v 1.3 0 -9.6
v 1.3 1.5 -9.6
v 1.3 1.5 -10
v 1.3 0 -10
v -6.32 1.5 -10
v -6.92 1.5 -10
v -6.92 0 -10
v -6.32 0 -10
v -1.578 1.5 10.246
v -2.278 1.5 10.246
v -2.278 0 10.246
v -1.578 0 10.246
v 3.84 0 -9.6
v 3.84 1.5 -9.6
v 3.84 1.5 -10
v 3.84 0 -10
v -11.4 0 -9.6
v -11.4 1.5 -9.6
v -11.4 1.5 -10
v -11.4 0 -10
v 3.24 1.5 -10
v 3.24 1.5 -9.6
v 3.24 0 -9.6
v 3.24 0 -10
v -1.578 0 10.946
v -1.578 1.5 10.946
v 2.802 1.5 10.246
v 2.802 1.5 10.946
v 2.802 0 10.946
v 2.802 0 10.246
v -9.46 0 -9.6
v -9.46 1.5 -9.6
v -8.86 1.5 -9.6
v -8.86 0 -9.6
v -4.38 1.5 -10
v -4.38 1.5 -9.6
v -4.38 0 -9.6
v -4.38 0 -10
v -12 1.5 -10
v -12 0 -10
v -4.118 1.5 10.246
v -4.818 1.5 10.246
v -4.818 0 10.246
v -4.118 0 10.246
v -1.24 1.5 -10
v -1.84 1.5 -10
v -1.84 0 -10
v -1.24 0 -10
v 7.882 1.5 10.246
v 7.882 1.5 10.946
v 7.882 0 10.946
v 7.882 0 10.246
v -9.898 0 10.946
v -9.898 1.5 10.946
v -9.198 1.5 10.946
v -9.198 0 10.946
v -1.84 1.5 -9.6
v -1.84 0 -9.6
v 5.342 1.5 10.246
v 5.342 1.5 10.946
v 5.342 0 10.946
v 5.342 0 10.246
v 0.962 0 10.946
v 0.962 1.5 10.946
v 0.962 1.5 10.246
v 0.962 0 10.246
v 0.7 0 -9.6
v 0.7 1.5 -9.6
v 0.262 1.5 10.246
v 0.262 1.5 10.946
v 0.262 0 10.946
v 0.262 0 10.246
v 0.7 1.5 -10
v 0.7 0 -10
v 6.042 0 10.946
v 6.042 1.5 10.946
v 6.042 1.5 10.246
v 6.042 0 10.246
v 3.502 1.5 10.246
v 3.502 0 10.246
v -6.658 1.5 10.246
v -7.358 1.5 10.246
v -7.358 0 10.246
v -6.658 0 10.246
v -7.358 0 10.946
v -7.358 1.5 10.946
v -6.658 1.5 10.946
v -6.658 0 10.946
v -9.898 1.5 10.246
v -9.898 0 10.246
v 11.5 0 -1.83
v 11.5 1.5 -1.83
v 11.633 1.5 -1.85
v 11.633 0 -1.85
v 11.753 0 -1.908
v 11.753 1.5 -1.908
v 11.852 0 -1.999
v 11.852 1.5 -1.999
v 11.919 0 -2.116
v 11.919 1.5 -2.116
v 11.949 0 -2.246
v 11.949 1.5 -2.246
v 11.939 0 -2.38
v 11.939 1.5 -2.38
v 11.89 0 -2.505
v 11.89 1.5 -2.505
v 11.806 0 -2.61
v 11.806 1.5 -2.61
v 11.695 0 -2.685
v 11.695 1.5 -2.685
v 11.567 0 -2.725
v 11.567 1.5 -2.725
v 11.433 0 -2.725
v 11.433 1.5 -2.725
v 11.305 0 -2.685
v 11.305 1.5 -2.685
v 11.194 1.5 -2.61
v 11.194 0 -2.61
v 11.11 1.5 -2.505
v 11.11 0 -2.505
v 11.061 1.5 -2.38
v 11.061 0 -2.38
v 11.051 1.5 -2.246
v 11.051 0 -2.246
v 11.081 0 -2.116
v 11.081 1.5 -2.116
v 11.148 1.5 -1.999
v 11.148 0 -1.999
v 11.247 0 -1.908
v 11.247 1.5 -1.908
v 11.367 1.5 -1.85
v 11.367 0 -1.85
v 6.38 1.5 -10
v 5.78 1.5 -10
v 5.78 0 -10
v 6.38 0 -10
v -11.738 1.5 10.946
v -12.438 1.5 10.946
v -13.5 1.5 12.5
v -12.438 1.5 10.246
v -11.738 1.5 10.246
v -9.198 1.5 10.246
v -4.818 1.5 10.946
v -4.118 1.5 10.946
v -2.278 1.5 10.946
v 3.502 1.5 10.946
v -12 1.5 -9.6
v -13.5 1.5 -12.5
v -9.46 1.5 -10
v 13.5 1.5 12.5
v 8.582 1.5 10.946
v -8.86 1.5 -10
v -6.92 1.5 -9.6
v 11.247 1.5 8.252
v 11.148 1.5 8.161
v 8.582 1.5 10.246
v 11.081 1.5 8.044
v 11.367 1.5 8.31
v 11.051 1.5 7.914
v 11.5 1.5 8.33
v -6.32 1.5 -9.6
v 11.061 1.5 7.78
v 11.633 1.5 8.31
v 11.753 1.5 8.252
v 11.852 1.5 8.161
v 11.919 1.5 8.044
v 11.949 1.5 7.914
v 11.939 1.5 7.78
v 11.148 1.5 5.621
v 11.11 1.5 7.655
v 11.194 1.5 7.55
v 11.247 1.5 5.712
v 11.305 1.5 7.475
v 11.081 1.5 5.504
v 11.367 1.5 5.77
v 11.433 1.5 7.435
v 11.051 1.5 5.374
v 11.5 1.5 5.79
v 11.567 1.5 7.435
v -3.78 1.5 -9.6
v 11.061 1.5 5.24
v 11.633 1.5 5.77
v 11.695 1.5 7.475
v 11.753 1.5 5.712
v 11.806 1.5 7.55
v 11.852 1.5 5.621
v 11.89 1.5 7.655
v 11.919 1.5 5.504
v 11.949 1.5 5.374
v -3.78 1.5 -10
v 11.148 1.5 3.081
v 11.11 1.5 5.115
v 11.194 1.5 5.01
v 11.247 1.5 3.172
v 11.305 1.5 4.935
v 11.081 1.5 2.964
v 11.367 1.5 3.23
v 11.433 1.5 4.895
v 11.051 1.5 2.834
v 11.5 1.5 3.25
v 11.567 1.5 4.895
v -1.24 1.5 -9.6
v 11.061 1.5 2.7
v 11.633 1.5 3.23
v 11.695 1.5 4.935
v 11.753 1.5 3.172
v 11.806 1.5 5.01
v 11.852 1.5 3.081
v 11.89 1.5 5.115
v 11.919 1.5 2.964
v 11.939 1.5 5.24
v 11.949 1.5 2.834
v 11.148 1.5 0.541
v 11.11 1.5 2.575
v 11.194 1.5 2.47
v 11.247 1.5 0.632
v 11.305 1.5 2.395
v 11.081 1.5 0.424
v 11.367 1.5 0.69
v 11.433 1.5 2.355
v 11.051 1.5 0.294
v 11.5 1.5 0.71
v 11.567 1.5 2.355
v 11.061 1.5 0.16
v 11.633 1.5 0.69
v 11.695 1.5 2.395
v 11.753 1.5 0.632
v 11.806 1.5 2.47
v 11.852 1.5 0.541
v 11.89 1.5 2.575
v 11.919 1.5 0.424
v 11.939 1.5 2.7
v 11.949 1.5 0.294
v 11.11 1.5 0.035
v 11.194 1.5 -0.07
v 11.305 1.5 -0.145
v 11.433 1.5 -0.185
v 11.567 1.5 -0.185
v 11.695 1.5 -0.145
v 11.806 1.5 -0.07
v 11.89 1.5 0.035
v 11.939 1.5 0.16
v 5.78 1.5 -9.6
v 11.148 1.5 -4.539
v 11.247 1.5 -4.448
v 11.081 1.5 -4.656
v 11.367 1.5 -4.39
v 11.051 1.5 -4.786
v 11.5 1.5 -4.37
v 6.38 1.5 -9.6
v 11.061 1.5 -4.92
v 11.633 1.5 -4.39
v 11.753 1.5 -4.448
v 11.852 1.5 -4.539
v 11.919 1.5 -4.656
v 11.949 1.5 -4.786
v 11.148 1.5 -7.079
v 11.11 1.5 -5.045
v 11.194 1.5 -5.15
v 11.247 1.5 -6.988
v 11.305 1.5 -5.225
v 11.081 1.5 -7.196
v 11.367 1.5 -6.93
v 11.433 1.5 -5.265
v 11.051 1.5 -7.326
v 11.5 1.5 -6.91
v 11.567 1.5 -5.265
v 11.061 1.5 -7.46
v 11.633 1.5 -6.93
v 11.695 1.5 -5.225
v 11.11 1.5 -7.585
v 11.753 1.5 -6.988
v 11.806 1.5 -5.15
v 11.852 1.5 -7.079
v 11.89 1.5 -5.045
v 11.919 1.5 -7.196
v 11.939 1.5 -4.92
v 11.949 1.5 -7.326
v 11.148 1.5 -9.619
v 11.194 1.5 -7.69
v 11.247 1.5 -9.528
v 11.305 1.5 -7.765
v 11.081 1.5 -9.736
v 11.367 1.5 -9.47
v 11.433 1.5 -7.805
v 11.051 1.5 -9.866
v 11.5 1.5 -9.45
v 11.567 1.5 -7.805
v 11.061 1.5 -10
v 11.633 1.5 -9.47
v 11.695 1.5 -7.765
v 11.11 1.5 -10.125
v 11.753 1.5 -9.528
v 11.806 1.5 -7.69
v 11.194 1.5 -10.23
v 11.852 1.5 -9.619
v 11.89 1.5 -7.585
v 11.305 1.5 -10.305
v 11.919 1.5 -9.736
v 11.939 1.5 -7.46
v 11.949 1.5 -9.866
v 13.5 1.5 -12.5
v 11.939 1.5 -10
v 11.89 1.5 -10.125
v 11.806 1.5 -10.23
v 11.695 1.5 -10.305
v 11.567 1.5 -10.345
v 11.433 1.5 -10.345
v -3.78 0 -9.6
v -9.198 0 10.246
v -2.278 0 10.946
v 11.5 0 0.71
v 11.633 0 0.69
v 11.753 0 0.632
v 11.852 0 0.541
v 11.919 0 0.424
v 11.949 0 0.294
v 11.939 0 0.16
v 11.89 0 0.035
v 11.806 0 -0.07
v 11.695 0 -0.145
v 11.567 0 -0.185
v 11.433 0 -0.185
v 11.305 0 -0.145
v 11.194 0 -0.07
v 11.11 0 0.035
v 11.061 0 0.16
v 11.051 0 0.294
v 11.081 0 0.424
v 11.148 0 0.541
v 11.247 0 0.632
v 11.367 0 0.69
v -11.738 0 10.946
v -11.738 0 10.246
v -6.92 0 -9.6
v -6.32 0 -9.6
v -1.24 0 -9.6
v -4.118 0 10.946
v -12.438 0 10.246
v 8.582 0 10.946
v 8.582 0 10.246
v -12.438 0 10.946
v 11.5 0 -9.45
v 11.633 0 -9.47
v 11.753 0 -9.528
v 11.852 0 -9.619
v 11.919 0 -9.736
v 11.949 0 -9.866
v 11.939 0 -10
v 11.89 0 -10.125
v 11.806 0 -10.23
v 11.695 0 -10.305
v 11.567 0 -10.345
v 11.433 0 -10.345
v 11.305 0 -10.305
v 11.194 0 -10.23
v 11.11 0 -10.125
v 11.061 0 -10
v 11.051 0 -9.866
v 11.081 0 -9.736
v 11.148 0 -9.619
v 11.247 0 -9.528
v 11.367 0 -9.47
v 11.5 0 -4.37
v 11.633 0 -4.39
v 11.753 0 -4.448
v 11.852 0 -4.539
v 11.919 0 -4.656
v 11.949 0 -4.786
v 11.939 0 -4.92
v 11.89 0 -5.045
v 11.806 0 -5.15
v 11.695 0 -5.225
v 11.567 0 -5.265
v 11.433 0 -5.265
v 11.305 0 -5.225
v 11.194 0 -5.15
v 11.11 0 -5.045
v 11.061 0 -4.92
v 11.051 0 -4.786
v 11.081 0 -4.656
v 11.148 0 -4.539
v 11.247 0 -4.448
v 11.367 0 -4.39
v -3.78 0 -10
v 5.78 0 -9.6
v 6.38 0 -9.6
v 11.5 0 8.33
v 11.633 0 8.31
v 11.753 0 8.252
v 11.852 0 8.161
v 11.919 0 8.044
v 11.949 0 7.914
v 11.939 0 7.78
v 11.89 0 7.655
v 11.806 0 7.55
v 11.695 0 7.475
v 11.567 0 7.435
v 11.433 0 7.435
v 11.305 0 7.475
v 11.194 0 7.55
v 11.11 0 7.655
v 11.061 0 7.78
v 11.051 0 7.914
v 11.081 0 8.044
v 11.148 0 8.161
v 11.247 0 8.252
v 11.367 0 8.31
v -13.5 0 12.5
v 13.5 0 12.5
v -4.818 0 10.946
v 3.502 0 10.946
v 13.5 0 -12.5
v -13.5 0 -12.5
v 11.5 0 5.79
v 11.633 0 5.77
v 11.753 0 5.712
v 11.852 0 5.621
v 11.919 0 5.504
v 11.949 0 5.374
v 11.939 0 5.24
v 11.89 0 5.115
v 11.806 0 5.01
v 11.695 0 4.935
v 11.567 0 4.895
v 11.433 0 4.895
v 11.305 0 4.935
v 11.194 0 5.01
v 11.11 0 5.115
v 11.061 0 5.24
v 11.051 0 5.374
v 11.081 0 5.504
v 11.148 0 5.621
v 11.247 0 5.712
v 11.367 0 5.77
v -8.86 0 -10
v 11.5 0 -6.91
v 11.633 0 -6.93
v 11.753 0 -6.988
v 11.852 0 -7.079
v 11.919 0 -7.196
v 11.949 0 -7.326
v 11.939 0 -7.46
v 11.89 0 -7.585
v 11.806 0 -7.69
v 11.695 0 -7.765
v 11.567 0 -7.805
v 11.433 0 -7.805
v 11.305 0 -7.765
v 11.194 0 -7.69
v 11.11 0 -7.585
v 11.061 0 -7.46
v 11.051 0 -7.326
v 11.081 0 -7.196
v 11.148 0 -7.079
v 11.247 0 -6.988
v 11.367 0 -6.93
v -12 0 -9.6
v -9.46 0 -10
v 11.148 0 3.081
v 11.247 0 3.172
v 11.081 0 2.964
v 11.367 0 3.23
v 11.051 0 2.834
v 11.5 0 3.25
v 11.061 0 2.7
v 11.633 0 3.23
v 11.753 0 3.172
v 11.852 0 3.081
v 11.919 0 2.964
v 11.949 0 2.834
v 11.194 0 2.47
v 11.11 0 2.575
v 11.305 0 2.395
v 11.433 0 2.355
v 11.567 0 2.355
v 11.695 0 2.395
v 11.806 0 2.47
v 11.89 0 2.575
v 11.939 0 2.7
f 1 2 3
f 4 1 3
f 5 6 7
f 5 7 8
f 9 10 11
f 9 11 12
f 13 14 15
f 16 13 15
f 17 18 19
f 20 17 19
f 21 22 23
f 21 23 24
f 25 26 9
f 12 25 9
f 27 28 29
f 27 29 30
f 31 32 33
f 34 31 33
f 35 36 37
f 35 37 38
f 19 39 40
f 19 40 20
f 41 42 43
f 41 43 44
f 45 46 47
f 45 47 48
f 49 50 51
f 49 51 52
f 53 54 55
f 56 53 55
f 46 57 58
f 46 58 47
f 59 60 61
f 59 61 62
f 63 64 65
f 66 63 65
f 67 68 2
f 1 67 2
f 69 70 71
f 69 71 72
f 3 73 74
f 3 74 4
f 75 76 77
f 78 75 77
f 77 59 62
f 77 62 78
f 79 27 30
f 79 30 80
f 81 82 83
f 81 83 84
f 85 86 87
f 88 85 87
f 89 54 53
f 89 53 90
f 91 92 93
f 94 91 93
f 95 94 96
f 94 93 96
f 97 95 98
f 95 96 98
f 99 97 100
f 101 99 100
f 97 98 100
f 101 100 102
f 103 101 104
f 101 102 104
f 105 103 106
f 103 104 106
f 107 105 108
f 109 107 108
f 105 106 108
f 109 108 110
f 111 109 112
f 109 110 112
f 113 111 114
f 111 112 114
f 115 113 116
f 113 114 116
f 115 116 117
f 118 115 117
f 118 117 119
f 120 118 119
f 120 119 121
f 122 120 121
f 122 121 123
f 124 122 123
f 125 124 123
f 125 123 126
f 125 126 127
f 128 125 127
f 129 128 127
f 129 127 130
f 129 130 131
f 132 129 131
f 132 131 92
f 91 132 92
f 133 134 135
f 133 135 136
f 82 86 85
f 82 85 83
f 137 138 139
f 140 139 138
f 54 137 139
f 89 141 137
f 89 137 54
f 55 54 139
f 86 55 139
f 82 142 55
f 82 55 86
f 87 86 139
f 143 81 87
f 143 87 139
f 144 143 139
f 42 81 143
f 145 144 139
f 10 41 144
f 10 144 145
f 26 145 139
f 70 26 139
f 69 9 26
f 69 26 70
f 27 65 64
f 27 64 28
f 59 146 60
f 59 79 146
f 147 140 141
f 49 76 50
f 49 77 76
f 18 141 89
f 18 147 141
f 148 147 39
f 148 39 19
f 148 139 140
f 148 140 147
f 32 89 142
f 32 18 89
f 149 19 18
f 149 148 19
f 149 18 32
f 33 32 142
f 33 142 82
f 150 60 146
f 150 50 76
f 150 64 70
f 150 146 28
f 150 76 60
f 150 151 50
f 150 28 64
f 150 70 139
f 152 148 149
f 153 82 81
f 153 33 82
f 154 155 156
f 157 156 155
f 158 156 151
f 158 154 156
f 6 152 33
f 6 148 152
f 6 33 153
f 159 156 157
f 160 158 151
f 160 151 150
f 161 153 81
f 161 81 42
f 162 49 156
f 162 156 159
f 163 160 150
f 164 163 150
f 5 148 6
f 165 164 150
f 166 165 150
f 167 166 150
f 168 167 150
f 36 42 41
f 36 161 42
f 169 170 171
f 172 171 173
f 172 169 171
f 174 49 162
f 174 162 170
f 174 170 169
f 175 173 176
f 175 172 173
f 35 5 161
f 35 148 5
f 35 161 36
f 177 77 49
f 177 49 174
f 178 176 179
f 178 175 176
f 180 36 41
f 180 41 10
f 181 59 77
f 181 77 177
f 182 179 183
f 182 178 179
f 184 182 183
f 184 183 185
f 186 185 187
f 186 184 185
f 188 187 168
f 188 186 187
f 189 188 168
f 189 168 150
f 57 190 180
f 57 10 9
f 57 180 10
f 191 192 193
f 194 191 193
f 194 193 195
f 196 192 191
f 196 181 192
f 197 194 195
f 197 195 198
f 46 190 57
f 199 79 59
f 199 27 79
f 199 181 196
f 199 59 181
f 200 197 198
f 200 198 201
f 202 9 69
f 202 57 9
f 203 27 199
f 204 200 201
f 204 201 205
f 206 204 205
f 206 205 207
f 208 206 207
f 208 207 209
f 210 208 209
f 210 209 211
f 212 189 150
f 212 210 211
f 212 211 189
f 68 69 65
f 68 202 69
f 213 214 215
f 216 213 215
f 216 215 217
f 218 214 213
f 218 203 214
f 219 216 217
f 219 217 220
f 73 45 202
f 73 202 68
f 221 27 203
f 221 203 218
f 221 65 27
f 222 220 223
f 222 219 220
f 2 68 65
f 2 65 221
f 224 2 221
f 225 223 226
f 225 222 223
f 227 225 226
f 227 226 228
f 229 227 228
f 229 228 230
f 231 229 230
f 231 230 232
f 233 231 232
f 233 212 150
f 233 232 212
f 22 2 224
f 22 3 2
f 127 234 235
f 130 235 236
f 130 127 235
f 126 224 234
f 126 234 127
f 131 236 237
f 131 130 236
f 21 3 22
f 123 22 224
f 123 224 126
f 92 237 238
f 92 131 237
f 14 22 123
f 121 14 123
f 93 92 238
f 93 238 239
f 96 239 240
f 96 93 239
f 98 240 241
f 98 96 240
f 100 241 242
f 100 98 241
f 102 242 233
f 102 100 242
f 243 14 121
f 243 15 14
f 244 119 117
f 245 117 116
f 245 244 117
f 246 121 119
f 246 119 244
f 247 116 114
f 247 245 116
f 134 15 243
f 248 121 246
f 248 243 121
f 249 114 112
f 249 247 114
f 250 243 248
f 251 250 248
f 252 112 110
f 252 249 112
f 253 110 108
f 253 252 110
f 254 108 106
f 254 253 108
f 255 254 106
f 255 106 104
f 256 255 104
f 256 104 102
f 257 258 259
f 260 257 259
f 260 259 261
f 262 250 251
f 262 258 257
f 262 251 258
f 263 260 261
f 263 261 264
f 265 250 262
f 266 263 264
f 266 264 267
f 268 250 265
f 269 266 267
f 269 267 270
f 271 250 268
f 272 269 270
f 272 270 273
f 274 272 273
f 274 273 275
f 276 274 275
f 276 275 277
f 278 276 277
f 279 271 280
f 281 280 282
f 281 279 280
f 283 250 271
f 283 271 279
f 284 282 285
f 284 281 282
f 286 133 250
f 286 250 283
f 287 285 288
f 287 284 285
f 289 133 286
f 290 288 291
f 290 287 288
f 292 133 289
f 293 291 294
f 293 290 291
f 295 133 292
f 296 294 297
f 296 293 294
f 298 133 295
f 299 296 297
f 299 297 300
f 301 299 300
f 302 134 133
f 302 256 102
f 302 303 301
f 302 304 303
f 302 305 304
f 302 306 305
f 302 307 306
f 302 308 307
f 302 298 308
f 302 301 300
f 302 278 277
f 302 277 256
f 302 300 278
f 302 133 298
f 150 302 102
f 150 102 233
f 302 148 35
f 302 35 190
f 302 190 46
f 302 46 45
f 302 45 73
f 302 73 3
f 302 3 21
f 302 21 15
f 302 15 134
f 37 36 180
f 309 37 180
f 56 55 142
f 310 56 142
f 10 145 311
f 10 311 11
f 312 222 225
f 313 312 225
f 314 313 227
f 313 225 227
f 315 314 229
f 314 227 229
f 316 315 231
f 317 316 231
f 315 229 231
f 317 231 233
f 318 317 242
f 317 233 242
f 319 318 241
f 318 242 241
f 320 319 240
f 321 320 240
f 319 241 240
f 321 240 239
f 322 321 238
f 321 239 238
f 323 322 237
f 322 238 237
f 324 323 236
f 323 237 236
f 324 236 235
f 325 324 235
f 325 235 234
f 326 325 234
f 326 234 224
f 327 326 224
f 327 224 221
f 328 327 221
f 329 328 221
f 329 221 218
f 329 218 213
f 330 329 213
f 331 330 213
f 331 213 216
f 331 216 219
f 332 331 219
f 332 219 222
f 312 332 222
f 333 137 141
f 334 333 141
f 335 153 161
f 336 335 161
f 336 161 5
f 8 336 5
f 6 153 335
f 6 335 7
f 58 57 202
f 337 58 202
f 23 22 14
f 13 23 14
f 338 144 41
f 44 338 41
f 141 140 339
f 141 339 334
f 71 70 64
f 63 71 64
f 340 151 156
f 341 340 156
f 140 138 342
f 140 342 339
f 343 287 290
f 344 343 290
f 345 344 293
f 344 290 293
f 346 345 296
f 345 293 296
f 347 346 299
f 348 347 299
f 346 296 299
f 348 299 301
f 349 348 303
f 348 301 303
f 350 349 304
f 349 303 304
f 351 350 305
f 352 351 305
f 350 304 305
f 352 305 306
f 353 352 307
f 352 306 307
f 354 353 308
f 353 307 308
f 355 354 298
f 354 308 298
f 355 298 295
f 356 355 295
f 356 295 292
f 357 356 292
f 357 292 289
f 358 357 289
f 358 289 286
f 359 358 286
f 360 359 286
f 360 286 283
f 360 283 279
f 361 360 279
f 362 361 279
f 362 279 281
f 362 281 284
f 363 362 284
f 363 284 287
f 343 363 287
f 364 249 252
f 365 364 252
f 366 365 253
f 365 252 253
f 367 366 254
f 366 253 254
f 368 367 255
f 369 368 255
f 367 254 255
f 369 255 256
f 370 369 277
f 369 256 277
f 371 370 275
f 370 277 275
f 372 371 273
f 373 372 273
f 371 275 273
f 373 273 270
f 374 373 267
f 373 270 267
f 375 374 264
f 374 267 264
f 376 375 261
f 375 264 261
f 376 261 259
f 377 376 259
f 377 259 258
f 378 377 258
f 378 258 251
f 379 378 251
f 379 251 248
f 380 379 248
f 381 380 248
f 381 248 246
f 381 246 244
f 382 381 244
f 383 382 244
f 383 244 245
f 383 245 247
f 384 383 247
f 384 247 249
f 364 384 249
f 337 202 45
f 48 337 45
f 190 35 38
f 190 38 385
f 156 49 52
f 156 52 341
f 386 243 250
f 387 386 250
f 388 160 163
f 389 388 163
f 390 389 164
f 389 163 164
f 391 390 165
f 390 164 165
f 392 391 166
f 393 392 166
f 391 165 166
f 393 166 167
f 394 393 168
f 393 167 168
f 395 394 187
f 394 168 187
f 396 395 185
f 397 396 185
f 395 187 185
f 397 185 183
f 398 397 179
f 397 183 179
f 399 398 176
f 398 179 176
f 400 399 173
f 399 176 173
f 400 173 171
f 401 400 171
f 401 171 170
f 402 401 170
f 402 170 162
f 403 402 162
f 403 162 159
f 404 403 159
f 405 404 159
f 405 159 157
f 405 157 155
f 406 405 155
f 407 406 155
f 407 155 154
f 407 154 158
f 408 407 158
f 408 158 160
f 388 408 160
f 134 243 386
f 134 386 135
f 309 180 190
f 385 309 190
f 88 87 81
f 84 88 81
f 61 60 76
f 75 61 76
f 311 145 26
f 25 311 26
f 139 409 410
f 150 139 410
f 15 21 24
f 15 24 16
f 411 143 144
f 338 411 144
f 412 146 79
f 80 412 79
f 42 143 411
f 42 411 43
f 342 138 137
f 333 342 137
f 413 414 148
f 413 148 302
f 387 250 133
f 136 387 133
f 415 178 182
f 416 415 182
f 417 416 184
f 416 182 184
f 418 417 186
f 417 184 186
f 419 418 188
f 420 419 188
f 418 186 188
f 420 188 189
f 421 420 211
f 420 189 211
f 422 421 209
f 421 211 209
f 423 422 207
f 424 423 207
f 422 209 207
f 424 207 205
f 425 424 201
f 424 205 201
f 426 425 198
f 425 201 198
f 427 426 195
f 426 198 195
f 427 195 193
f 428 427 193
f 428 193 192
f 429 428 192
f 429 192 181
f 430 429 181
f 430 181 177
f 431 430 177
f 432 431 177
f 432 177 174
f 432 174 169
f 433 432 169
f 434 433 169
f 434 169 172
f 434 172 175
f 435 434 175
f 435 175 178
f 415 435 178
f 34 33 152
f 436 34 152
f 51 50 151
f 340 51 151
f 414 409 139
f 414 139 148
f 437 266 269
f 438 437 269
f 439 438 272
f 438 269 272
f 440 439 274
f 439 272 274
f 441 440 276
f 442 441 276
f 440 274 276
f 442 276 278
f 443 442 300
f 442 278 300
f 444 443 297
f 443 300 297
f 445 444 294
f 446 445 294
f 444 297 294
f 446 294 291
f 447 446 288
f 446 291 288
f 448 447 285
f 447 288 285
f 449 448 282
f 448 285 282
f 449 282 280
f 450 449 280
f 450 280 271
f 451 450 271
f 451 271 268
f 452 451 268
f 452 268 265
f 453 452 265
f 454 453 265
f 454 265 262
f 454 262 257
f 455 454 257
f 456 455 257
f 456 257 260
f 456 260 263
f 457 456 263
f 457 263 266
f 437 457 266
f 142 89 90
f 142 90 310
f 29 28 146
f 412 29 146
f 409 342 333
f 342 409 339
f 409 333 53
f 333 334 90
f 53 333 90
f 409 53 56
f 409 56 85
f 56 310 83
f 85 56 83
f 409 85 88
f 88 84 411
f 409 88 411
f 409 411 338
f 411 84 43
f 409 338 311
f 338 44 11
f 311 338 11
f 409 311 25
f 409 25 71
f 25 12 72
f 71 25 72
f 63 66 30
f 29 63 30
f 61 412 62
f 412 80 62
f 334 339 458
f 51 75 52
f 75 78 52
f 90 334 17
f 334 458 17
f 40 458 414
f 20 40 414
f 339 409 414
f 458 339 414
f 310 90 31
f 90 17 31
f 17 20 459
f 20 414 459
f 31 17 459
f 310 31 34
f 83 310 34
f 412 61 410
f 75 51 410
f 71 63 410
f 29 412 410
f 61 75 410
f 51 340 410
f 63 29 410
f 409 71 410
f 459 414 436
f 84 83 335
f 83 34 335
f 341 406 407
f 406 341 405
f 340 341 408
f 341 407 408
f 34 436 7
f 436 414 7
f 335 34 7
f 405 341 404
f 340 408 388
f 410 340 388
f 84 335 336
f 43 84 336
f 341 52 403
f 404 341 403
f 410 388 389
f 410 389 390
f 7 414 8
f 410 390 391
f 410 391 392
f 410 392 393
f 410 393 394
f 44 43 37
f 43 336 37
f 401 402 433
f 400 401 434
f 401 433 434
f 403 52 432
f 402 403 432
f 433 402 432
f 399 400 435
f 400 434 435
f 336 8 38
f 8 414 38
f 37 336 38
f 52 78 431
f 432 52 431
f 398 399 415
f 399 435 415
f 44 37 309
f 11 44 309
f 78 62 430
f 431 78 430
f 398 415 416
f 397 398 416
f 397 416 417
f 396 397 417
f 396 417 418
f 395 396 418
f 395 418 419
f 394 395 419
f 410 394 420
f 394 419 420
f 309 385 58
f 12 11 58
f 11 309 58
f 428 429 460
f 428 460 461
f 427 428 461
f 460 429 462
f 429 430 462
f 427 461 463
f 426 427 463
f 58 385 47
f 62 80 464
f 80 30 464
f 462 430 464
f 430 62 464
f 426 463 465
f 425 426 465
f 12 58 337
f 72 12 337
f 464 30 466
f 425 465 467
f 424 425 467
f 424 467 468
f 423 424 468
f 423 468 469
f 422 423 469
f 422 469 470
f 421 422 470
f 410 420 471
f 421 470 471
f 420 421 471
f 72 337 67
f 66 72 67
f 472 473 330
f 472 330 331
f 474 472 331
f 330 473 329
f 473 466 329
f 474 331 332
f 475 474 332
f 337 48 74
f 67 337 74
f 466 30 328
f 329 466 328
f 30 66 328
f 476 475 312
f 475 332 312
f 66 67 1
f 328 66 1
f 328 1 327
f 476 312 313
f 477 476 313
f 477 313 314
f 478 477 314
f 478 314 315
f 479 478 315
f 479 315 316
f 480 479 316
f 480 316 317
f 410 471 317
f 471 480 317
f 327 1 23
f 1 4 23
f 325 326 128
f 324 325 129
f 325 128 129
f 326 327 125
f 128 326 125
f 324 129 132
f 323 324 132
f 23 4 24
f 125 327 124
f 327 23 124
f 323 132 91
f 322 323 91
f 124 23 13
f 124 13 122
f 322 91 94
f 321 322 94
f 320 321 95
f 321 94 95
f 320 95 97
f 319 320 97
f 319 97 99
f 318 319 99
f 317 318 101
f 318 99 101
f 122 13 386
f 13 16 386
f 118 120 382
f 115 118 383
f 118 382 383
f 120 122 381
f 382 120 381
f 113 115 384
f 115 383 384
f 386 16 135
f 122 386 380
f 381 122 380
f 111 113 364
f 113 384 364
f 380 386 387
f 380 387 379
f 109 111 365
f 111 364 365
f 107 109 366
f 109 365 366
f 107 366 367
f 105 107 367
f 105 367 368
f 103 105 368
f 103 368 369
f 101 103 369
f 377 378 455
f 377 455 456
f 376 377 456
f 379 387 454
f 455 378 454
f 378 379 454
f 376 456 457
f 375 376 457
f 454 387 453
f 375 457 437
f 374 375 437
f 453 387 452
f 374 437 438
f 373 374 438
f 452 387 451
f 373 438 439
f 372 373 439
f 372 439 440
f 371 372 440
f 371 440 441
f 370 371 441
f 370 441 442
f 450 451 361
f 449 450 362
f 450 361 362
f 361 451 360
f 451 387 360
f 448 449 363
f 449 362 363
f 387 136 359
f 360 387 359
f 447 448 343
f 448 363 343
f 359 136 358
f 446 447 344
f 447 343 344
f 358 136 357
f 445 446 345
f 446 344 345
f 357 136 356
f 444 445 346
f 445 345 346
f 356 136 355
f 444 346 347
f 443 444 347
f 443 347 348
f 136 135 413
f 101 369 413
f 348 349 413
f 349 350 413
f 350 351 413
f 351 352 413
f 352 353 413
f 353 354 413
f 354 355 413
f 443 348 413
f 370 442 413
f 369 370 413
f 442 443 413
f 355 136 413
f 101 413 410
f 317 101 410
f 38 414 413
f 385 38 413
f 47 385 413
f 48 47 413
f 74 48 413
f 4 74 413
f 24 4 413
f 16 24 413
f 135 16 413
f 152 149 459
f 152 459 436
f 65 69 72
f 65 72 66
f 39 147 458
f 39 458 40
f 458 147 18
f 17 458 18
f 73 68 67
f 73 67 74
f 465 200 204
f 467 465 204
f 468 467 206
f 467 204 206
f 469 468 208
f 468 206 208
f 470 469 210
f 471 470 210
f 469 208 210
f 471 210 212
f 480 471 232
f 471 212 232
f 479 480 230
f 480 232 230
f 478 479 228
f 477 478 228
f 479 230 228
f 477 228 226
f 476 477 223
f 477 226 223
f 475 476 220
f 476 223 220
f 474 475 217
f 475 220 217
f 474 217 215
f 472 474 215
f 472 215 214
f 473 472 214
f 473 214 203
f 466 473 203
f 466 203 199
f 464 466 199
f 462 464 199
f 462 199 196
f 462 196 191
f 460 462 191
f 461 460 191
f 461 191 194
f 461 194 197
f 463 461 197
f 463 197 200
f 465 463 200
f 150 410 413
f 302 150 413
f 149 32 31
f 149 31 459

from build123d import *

# Parameters (mm, degrees)
SKETCH_1_W          = 27
SKETCH_1_H          = 25
EXTRUDE_1_DEPTH     = 1.5
SKETCH_2_R          = 0.45
SKETCH_2_W          = 0.6
SKETCH_2_H          = 0.4
SKETCH_2_W_2        = 0.7
SKETCH_2_H_2        = 0.7
CUT_EXTRUDE_1_DEPTH = 19.459414942


with BuildPart() as part:
    # Эскиз1 → Бобышка-Вытянуть1 (new body)
    with BuildSketch(Plane(origin=(0, 0, 0), x_dir=(1, 0, 0), z_dir=(0, 1, 0))):
        Rectangle(SKETCH_1_W, SKETCH_1_H)
    extrude(amount=EXTRUDE_1_DEPTH)

    # Эскиз2 → Вырез-Вытянуть1 (cut, through all)
    with BuildSketch(Plane(origin=(0, 1.5, 0), x_dir=(1, 0, 0), z_dir=(0, 1, 0))):
        with Locations(Location((11.5, 9.9, 0), (0, 0, 270))):
            Circle(SKETCH_2_R)
        with Locations(Location((11.5, 7.36, 0), (0, 0, 270))):
            Circle(SKETCH_2_R)
        with Locations(Location((11.5, 4.82, 0), (0, 0, 270))):
            Circle(SKETCH_2_R)
        with Locations(Location((11.5, 2.28, 0), (0, 0, 270))):
            Circle(SKETCH_2_R)
        with Locations(Location((11.5, -0.26, 0), (0, 0, 270))):
            Circle(SKETCH_2_R)
        with Locations(Location((11.5, -2.8, 0), (0, 0, 270))):
            Circle(SKETCH_2_R)
        with Locations(Location((11.5, -5.34, 0), (0, 0, 270))):
            Circle(SKETCH_2_R)
        with Locations(Location((11.5, -7.88, 0), (0, 0, 270))):
            Circle(SKETCH_2_R)
        with Locations((-9.16, 9.8)):
            Rectangle(SKETCH_2_W, SKETCH_2_H)
        with Locations((-11.7, 9.8)):
            Rectangle(SKETCH_2_W, SKETCH_2_H)
        with Locations((-6.62, 9.8)):
            Rectangle(SKETCH_2_W, SKETCH_2_H)
        with Locations((-4.08, 9.8)):
            Rectangle(SKETCH_2_W, SKETCH_2_H)
        with Locations((-1.54, 9.8)):
            Rectangle(SKETCH_2_W, SKETCH_2_H)
        with Locations((1, 9.8)):
            Rectangle(SKETCH_2_W, SKETCH_2_H)
        with Locations((3.54, 9.8)):
            Rectangle(SKETCH_2_W, SKETCH_2_H)
        with Locations((6.08, 9.8)):
            Rectangle(SKETCH_2_W, SKETCH_2_H)
        with Locations((-9.547856055, -10.59636646)):
            Rectangle(SKETCH_2_W_2, SKETCH_2_H_2)
        with Locations((-7.007856055, -10.59636646)):
            Rectangle(SKETCH_2_W_2, SKETCH_2_H_2)
        with Locations((-4.467856055, -10.59636646)):
            Rectangle(SKETCH_2_W_2, SKETCH_2_H_2)
        with Locations((-1.927856055, -10.59636646)):
            Rectangle(SKETCH_2_W_2, SKETCH_2_H_2)
        with Locations((0.612143945, -10.59636646)):
            Rectangle(SKETCH_2_W_2, SKETCH_2_H_2)
        with Locations((3.152143945, -10.59636646)):
            Rectangle(SKETCH_2_W_2, SKETCH_2_H_2)
        with Locations((5.692143945, -10.59636646)):
            Rectangle(SKETCH_2_W_2, SKETCH_2_H_2)
        with Locations((8.232143945, -10.59636646)):
            Rectangle(SKETCH_2_W_2, SKETCH_2_H_2)
        with Locations((-12.087856055, -10.59636646)):
            Rectangle(SKETCH_2_W_2, SKETCH_2_H_2)
    extrude(amount=-CUT_EXTRUDE_1_DEPTH, mode=Mode.SUBTRACT)


solid = part.part
